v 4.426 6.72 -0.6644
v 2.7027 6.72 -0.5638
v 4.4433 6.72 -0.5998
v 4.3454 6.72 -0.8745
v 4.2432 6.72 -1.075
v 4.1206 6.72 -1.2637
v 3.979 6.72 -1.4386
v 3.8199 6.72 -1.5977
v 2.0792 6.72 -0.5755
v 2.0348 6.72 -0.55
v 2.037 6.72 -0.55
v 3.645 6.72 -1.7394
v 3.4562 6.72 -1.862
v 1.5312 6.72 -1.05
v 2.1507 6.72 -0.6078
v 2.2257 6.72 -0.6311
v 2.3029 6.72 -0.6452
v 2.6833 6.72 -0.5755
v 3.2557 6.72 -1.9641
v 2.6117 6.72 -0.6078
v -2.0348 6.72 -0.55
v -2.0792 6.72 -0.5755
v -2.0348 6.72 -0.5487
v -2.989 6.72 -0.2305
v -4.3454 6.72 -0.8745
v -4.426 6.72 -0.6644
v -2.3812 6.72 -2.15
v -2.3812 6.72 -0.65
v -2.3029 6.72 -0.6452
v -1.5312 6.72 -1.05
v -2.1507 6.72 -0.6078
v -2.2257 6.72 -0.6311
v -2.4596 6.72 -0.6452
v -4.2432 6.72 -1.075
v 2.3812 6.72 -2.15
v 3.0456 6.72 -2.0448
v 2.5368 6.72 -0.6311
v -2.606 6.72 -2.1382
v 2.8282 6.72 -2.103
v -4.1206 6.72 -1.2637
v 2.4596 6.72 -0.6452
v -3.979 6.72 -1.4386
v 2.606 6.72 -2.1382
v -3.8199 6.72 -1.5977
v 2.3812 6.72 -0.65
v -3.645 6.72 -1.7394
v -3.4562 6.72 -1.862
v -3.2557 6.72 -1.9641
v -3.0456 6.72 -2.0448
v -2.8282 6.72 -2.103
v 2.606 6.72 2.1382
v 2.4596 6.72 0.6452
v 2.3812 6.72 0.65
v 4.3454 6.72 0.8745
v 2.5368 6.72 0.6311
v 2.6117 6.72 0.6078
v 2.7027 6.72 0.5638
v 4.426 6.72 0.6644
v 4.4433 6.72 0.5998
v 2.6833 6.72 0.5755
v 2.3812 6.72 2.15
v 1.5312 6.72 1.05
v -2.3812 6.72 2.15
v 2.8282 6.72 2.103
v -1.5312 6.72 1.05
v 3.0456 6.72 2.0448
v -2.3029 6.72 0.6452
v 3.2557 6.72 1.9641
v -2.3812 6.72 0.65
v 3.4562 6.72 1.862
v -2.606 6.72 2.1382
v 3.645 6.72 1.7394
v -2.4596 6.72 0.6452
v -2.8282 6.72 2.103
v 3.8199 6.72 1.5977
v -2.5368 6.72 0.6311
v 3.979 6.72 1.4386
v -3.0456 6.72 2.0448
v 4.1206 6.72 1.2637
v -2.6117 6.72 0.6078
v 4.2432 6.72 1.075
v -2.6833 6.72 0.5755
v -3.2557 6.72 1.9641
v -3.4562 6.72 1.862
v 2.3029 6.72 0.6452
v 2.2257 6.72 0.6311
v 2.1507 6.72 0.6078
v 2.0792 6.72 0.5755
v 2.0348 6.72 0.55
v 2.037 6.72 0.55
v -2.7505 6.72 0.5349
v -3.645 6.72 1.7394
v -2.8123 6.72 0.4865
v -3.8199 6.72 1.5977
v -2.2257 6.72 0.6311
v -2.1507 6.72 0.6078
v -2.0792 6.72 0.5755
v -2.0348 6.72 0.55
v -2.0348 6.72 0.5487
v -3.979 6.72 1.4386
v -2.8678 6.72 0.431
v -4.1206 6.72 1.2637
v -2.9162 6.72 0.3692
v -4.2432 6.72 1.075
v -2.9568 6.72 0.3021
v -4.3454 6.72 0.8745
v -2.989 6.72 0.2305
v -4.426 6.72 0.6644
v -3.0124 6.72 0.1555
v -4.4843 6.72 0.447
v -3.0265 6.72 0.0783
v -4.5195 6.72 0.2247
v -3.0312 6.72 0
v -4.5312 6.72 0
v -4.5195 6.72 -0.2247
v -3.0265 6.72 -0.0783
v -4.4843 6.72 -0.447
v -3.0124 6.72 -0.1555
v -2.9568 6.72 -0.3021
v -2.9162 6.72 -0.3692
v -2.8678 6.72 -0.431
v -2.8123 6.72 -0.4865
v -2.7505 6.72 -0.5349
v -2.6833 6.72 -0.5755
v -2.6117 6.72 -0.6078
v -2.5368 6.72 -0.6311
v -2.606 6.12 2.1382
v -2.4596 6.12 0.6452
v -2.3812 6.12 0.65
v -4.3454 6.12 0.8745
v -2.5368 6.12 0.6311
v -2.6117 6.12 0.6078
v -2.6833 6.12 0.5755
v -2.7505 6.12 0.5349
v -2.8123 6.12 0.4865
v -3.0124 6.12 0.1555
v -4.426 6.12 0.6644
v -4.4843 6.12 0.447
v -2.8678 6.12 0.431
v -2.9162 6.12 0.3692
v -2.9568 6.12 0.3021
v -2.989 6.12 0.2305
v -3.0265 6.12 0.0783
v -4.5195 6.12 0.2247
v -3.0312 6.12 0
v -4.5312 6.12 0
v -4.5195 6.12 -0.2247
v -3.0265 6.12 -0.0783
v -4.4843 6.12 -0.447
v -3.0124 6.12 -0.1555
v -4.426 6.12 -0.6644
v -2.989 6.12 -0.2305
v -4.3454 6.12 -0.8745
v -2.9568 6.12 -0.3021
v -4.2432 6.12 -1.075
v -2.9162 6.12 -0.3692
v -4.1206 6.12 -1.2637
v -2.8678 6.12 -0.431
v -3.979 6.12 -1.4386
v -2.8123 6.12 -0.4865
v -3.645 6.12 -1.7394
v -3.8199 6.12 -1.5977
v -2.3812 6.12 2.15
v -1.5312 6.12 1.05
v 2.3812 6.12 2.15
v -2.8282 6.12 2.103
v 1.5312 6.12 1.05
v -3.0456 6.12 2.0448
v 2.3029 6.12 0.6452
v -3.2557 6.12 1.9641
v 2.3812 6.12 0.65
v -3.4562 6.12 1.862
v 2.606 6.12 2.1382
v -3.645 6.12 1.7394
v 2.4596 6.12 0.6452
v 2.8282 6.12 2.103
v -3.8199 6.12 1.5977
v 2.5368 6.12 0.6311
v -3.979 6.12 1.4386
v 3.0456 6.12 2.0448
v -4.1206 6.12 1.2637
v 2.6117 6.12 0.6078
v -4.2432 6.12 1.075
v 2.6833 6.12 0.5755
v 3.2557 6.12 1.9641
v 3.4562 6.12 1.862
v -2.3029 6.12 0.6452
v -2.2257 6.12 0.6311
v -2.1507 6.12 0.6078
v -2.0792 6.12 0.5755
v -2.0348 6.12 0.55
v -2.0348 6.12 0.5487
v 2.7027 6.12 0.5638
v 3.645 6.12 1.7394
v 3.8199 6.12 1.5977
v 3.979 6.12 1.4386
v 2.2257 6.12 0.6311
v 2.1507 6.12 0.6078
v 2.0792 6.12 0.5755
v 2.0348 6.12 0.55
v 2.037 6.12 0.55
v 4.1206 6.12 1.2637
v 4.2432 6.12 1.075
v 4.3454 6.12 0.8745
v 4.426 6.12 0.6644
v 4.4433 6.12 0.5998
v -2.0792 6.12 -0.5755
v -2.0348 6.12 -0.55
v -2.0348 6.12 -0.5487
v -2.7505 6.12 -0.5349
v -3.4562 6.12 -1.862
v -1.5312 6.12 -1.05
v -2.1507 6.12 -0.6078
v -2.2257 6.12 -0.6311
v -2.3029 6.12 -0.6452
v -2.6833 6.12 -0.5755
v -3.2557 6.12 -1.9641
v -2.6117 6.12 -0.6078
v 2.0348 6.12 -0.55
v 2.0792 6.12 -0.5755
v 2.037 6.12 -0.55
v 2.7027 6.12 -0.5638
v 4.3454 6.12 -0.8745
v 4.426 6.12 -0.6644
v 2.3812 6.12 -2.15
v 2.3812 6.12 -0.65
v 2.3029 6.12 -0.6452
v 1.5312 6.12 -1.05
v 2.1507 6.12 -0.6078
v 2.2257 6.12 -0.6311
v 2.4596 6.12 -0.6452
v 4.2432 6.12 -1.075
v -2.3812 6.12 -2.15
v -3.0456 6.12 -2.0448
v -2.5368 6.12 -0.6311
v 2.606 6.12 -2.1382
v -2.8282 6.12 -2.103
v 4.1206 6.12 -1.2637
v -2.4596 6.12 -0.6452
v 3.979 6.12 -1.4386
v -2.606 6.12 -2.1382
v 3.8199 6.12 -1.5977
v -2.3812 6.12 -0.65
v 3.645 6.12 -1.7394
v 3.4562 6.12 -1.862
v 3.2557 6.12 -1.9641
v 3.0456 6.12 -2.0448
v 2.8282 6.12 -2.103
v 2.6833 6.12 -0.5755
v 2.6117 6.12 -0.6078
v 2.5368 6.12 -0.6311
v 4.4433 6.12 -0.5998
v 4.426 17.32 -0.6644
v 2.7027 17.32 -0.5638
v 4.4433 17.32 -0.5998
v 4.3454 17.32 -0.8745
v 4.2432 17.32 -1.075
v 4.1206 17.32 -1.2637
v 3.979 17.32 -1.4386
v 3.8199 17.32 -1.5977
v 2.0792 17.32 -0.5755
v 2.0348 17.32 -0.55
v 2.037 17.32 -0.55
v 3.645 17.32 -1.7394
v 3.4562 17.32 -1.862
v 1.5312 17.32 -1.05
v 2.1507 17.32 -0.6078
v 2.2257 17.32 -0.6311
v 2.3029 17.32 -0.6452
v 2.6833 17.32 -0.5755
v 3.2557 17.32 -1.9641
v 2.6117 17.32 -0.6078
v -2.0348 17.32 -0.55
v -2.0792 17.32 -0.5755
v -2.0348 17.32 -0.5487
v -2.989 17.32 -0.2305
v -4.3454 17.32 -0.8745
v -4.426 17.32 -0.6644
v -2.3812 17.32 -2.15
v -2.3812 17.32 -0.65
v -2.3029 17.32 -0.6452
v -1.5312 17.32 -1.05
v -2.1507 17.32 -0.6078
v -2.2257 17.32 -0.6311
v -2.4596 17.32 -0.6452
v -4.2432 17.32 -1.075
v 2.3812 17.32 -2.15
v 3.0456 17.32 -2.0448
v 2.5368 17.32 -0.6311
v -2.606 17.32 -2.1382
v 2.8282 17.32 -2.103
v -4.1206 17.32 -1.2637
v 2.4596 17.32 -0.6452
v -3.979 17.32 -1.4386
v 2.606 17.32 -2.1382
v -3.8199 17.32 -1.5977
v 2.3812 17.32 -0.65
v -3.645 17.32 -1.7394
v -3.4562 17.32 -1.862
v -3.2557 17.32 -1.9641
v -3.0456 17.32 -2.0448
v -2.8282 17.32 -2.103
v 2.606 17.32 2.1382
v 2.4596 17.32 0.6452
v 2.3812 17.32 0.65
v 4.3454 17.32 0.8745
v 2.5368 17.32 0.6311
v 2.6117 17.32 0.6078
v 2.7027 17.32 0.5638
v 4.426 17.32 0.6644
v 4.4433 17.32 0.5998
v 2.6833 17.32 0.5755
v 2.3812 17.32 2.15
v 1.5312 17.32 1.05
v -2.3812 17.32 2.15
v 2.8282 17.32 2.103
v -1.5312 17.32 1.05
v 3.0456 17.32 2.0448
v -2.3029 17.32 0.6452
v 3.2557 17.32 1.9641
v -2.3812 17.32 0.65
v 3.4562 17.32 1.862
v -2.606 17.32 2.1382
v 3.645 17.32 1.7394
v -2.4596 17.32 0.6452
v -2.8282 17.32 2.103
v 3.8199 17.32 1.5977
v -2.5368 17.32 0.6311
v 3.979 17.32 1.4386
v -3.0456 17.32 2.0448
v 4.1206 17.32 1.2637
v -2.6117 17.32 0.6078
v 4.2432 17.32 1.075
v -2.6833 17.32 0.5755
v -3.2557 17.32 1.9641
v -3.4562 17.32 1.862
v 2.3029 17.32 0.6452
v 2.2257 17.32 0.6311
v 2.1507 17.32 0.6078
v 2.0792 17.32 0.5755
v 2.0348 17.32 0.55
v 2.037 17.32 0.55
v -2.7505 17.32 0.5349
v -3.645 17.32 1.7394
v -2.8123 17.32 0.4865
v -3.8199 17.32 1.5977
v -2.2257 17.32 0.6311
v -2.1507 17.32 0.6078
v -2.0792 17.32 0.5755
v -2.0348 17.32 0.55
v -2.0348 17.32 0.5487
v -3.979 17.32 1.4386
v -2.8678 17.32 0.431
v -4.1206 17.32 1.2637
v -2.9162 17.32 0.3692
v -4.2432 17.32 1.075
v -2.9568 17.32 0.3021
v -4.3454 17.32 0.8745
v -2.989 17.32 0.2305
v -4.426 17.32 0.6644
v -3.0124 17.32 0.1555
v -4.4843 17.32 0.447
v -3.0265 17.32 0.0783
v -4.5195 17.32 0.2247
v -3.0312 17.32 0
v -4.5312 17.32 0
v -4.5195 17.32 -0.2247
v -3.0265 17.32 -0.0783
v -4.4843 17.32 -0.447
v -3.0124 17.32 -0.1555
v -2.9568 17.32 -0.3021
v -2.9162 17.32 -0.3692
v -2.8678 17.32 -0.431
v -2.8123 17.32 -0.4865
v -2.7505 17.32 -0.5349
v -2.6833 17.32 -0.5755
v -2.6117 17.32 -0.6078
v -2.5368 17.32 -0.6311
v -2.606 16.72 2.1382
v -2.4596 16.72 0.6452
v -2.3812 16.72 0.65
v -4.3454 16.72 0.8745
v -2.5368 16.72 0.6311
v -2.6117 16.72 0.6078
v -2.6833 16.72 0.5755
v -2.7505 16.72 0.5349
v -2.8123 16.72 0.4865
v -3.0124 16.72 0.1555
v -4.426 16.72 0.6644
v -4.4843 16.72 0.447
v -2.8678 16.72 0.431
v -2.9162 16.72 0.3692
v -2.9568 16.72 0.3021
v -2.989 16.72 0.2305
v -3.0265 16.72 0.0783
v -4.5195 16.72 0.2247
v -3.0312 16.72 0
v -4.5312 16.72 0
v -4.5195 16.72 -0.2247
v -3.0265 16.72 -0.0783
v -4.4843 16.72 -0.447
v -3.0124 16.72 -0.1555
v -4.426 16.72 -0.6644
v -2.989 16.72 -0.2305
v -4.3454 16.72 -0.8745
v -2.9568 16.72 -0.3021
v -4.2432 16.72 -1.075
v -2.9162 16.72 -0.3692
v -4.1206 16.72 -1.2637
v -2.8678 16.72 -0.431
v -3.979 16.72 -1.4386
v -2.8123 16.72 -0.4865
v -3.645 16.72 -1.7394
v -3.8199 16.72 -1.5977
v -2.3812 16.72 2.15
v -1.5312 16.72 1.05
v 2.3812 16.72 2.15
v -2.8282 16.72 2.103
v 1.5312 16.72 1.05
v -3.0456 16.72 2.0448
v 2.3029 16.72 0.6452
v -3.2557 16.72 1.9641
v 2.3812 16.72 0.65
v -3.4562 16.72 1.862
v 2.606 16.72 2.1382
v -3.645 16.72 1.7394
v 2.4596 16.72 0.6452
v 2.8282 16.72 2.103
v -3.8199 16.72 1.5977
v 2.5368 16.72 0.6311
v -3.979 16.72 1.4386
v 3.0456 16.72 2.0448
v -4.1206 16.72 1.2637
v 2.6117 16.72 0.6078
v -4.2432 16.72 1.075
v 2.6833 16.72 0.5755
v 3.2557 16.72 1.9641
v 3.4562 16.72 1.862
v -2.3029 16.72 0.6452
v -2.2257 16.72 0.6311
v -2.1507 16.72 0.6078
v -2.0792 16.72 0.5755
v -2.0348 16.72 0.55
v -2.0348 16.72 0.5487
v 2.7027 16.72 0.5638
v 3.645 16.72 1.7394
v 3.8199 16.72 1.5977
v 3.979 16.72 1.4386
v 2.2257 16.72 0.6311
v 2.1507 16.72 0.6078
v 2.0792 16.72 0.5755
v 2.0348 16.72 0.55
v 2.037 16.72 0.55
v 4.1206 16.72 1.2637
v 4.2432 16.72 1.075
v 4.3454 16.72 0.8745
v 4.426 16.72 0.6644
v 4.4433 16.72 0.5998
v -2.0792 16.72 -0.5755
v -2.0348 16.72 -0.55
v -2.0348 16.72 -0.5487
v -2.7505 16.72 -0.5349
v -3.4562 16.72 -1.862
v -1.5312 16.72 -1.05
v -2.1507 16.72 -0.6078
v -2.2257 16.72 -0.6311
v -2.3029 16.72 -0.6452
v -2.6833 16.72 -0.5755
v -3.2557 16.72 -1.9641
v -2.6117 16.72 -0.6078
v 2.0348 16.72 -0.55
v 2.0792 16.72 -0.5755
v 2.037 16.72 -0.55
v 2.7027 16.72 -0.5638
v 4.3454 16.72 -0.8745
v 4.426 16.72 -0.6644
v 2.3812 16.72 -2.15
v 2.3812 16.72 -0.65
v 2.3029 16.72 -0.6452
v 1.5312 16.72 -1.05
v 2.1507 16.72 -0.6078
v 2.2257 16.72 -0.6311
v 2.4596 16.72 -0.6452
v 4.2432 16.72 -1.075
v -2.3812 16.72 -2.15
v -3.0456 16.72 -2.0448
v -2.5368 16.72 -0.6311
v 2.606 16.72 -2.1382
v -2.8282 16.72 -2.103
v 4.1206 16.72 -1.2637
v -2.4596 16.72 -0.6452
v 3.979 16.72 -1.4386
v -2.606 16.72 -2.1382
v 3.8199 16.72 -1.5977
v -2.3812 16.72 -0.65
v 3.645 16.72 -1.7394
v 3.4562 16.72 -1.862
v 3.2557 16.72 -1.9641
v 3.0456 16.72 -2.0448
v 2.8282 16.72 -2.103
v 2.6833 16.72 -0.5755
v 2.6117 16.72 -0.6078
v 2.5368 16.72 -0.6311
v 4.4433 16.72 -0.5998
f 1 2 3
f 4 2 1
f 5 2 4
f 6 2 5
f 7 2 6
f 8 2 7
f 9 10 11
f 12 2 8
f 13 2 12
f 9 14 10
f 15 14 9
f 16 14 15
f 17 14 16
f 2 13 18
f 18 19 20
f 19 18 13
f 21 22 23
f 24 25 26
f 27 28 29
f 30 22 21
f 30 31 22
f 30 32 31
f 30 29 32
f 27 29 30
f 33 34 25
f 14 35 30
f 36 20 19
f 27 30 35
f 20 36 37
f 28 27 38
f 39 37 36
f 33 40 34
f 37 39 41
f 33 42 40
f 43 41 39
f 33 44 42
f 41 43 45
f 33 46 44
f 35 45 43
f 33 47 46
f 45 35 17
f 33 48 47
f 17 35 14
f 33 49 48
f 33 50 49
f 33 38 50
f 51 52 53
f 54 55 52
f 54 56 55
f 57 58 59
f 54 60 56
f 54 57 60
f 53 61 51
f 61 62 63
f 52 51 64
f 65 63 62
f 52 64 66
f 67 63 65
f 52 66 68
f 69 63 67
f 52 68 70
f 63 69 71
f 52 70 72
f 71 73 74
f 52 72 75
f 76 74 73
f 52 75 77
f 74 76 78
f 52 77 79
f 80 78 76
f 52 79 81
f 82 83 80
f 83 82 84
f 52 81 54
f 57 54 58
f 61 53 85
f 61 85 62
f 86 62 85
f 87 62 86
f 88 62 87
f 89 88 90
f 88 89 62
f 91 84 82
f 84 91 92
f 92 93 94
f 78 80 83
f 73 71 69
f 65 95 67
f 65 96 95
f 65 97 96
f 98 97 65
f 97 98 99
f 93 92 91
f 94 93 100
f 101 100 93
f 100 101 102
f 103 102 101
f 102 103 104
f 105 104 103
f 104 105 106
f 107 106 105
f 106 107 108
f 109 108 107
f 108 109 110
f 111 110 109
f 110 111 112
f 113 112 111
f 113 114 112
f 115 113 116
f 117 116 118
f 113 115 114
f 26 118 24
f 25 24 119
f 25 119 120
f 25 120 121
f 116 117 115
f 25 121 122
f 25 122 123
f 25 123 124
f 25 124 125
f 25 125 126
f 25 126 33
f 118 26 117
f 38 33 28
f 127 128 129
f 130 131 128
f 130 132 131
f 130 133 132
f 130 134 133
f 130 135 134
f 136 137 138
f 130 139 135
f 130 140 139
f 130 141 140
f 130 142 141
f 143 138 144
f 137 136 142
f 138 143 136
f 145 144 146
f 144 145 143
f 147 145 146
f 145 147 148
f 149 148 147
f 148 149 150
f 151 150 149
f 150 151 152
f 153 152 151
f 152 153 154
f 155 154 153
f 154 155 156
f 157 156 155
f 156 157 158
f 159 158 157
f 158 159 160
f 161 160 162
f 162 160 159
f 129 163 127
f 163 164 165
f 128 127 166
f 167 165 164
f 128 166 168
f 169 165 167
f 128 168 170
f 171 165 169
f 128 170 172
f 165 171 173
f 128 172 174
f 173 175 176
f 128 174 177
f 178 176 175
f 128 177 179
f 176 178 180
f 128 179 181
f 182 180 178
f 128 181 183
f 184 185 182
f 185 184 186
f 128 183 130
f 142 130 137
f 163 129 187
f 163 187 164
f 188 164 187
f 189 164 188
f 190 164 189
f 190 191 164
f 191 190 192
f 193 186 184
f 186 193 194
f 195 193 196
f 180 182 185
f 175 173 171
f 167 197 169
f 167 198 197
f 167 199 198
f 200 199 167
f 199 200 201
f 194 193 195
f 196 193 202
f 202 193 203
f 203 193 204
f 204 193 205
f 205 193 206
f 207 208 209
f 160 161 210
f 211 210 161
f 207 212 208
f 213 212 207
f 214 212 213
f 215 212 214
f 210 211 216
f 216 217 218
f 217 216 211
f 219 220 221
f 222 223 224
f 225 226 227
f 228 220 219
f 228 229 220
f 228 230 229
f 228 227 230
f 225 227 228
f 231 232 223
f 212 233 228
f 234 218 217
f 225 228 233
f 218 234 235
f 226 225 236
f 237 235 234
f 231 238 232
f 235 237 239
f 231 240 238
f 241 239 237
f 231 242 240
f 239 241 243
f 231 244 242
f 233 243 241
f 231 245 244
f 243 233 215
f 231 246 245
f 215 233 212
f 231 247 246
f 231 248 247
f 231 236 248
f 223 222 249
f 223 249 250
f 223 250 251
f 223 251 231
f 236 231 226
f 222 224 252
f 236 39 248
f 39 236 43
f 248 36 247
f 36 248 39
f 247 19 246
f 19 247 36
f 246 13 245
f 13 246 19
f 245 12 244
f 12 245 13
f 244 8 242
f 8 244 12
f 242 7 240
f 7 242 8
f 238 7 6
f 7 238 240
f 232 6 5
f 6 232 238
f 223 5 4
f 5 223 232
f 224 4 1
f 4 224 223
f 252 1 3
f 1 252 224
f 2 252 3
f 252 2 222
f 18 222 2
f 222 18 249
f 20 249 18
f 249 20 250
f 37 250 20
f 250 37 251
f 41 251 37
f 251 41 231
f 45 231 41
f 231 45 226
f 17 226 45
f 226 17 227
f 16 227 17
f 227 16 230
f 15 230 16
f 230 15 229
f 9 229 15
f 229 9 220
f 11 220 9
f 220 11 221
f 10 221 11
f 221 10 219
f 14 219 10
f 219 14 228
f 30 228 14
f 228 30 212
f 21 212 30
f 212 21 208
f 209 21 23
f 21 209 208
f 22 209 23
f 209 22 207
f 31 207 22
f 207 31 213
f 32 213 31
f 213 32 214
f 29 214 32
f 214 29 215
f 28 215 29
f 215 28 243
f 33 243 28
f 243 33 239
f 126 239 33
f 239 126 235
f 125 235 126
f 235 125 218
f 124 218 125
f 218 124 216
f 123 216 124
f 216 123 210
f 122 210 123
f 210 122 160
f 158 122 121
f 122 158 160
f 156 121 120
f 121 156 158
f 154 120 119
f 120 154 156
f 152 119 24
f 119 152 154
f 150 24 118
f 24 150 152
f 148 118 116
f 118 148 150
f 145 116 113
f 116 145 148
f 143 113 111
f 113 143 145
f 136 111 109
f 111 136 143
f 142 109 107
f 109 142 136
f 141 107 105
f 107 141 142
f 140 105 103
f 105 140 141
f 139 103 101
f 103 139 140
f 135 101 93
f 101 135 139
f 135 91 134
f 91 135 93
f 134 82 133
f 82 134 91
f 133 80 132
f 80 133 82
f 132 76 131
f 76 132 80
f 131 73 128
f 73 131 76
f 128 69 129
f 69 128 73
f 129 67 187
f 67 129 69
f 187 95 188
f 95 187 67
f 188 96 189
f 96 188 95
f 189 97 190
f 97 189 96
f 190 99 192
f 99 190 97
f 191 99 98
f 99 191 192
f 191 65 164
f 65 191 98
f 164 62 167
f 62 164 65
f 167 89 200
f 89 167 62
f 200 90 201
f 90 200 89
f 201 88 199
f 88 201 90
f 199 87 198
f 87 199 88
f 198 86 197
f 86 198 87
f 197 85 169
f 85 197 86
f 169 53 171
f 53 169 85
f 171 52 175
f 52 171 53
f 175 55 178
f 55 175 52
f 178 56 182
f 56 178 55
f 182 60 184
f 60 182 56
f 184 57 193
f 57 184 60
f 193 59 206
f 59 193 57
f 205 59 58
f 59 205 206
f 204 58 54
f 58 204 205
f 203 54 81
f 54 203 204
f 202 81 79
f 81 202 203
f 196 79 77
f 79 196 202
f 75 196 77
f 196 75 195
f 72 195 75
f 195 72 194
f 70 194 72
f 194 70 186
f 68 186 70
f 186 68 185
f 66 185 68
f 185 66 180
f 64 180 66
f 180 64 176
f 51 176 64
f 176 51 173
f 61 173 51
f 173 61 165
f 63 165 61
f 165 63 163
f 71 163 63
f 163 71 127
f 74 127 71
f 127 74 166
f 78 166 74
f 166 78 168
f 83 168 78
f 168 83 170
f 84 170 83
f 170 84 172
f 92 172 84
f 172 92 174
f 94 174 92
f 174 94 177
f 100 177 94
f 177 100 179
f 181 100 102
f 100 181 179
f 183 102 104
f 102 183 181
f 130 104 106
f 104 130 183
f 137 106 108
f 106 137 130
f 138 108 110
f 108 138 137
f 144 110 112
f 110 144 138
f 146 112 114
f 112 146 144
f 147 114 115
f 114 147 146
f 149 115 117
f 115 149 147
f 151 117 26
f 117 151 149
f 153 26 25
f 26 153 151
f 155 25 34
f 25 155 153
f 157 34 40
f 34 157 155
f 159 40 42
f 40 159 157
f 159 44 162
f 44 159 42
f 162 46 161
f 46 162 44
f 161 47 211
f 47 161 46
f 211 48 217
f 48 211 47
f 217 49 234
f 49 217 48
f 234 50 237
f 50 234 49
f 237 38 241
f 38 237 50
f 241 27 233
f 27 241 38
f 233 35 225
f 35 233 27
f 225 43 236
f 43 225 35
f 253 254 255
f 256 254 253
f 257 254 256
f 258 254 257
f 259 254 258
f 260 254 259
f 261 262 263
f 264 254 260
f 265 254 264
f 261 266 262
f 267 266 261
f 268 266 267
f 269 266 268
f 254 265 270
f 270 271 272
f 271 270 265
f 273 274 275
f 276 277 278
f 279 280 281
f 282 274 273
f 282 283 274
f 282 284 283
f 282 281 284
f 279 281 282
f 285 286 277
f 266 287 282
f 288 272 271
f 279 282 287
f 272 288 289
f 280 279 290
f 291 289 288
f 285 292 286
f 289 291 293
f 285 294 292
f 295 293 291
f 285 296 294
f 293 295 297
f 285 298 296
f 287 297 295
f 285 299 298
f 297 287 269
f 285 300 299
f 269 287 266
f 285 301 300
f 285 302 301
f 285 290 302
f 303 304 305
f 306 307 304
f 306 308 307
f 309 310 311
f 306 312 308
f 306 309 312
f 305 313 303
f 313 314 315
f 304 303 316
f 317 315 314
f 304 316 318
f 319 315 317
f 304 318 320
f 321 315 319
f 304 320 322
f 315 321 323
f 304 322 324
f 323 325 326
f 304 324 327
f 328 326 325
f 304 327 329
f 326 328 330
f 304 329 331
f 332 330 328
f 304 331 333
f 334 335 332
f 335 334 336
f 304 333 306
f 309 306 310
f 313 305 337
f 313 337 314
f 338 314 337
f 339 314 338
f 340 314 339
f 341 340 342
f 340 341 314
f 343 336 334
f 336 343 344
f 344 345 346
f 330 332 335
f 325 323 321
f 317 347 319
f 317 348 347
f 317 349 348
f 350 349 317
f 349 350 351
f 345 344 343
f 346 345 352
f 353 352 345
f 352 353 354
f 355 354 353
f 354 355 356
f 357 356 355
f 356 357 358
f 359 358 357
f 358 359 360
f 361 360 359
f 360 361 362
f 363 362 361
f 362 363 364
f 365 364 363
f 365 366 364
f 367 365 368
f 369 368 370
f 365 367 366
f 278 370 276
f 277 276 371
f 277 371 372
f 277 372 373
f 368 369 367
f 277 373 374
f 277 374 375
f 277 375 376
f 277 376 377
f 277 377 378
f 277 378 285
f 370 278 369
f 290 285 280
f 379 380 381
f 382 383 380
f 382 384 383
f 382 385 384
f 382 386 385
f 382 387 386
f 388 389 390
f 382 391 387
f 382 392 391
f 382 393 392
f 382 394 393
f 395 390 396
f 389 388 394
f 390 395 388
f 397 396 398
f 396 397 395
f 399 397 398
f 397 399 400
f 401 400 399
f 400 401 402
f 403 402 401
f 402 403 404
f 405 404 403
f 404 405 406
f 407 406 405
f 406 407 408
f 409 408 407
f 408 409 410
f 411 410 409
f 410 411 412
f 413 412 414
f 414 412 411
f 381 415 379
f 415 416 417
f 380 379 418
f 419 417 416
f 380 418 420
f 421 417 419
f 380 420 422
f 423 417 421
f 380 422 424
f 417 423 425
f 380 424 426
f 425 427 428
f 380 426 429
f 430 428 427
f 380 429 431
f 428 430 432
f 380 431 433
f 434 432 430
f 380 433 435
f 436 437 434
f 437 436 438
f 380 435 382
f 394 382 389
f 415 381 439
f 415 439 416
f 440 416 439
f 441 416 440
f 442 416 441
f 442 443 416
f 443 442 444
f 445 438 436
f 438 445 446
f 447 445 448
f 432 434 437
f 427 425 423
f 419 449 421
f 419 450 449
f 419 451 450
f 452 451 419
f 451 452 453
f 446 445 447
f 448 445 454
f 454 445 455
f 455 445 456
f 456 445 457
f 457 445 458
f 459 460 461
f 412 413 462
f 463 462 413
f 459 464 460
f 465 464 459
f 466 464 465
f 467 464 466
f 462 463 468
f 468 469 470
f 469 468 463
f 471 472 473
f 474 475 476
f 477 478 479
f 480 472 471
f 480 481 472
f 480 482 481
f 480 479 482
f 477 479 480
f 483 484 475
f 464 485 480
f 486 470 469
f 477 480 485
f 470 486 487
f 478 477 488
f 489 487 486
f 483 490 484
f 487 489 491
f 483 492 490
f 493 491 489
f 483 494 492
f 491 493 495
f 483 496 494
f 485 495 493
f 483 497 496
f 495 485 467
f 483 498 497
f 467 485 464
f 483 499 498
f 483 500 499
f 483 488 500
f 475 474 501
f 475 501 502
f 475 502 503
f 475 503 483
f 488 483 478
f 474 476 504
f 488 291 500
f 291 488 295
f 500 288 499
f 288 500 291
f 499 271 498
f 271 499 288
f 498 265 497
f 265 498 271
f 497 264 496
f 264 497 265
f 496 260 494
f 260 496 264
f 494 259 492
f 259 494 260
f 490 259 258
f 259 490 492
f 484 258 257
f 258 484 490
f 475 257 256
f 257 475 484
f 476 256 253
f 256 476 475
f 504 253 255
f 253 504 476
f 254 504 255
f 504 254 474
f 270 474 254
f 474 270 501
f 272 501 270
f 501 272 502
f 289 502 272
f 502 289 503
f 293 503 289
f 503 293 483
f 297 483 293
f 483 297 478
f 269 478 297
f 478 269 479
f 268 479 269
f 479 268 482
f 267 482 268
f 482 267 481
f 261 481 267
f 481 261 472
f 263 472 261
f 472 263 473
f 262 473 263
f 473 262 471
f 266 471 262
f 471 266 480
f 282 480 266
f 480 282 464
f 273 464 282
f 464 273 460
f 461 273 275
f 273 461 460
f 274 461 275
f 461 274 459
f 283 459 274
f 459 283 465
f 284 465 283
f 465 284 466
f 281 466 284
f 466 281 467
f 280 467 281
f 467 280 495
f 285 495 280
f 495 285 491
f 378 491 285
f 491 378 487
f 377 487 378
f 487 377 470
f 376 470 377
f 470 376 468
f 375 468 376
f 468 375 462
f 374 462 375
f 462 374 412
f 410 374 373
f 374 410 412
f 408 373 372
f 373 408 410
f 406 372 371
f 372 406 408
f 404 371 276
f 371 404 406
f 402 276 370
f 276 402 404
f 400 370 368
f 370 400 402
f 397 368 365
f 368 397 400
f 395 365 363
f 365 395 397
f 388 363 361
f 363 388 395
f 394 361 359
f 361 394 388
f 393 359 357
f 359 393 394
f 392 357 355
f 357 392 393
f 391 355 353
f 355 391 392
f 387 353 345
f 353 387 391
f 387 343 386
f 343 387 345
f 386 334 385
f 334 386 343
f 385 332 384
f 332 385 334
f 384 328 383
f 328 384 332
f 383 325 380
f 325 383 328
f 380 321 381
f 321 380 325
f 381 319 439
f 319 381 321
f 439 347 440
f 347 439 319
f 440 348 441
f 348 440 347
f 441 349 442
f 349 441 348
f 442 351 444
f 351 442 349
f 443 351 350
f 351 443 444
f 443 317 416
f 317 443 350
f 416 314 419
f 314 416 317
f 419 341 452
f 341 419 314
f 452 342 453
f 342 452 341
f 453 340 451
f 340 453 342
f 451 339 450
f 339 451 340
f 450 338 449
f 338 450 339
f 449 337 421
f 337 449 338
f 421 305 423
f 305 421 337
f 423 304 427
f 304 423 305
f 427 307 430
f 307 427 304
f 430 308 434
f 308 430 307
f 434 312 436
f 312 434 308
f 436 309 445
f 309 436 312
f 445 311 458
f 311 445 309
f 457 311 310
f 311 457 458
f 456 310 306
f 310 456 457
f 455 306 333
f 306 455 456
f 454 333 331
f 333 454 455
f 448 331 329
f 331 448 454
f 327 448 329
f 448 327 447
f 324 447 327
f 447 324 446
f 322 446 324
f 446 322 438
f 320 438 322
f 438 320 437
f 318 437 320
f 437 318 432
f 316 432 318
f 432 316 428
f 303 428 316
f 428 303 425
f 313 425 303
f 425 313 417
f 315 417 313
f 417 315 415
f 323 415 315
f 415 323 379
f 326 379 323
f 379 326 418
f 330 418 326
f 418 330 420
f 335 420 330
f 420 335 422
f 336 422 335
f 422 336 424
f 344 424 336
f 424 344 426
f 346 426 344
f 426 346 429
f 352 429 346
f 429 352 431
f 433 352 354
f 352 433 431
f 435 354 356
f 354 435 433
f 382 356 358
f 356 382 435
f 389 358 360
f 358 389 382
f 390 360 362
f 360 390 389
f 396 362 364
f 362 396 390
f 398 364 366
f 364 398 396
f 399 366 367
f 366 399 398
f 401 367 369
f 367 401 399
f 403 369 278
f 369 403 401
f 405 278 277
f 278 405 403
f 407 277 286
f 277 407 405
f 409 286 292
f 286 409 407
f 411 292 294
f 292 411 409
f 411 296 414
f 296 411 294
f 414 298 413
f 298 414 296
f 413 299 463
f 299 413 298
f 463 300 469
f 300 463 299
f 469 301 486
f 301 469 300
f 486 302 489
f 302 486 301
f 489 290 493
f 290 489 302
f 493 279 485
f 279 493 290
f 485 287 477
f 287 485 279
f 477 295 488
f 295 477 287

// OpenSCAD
// file: ch1_03c_params.scad
// CH1 03C 单排滚子链 — 尺寸真值源：docs/parts/CH1-03C-roller-chain.md
// 单位：毫米。这是外购碳钢链条的 CAD 包络，不是 FDM 打印件。

//#region 导入/依赖
// 无外部库；几何由本文件常数驱动。
//#endregion

//#region 常量/配置
P = 4.7625;          // 节距：系列表 / SKU 210L（图面写 4.762）
h2 = 4.3;            // 内链板高度 h2（卖家图 + ISO h2 max）
d1 = 2.48;           // 03C 图面「滚子」= ISO 套筒外径 d1 max（本规格无独立滚子）
d2 = 1.62;           // 销轴直径 d2 max
Lc = 6.9;            // ISO / 图面销轴总长 Lc max；装配外形用贴板铆头，不把细杆伸出这么长
L = 6.10;            // 铆头内侧销长 L max（ISO，图面未标数）
T = 0.6;             // 链板厚度 T max
b1 = 2.38;           // 内节内宽 b1 min（ISO；图面有符号无数字）
waist = 2.6;         // 链板腰宽：按卖家 8 字外形，不是标准表列
rivet_d = 2.15;      // 铆头直径：按侧视铆头 > d2
rivet_h = 0.40;      // 贴在外板外侧的铆头高度；避免 (Lc-L)/2 拉出细 stem
fillet = 0.42;       // 腰部凹圆角
roller_end_gap = 0.02;  // 仅 CSG 间隙，不留可见轴向窜动
journal_od = 2.05;      // 穿内板轴颈；可见鼓面仍用 d1
links_sku = 210;

inner_width = b1;
bushing_od = journal_od;
plate_stack = inner_width + 4 * T;
outer_face = plate_stack / 2;
pin_length = plate_stack + 2 * rivet_h;
visible_bush_len = inner_width - 2 * roller_end_gap;
clearance = 0.04;
eps = 0.05;
//#endregion

//#region 模型/类型
// 无独立类型；零件由 inner/outer plate、roller、pin、bushing 组成。
//#endregion

//#region 私有成员
// 几何常数全部公开给根模型 include。
//#endregion

//#region 公开 API
// include 后直接使用 P / h2 / d1 / d2 / pin_length / T。
//#endregion

//#region 业务逻辑
// SKU 210L × 4.7625 mm = 1000.125 mm。
// b1 / L 图面未标数，取 ISO 03C min/max；链板腰宽按卖家 8 字外形。
// 可见套筒长度必须是 b1，不是 b1+2T；后者会从斜向看成过长的连接棍。
// 销轴细杆只穿过板叠；铆头贴外板。Lc=6.9 是规格上限，不是要把 stem 拉到 6.9。
//#endregion

//#region 方法/工具
// 无。
//#endregion
// file: parts/ch1_03c_connecting_link_params.scad
// CH1 03C 连接节五金 — 由 docs/parts/CH1-03C-roller-chain.md 参数化
// 单位：毫米。03C 链条本体是外购碳钢件；这里是连接节穿销/弹片的参考模型。

//#region 导入/依赖
include <../ch1_03c_params.scad>
//#endregion

//#region 常量/配置
$fa = 6;
$fs = 0.08;

// 文档明确给出的连接节主尺寸。
CONNECTING_PIN_PAIR_SPACING = P;       // 两根穿销的中心距 = 链条节距
CONNECTING_PIN_SHAFT_D = d2;           // 03C 销轴直径
CONNECTING_PIN_LENGTH = Lc;            // 03C 图面销轴总长
CONNECTING_PIN_HEAD_D = rivet_d;       // 固定端圆头的参考直径
CONNECTING_PIN_HEAD_H = rivet_h;

// 卖家文档没有给 03C CL 卡簧的完整展开图；以下是按用户提供的
// 「加长销/加长销带挡板」图和实物照片建立的装配参考假设。
// 卡簧按用户给出的实物轮廓建模：右端敞口；两根销的位置各有一段围绕销槽
// 的圆弧，圆弧之间由上下两条收腰弹臂连接。它不是等宽 U 槽，也不是两个
// 独立的 C 形耳片或实心连接链板。
CONNECTING_PIN_GROOVE_D = 1.20;
RETAINING_CLIP_T = T;                 // 03C 片厚；图示 04C 的 T=0.8 不套用
// 槽宽要覆盖整片厚度，并留少量侧向装配余量；原 0.34 mm 小于片厚，不能落槽。
CONNECTING_PIN_GROOVE_W = RETAINING_CLIP_T + 0.12;
CONNECTING_PIN_GROOVE_FROM_TIP = 0.48;
CONNECTING_PIN_GROOVE_CENTER = CONNECTING_PIN_LENGTH / 2 - CONNECTING_PIN_GROOVE_FROM_TIP;
CONNECTING_LINK_EPS = 0.05;
RETAINING_CLIP_H = h2;                // 外轮廓高度，沿用连接节链板高度
RETAINING_CLIP_OUTER_R = RETAINING_CLIP_H / 2;
RETAINING_CLIP_PIN_ARC_INNER_R = CONNECTING_PIN_GROOVE_D / 2 + 0.05;
RETAINING_CLIP_CLOSED_PIN_X = -CONNECTING_PIN_PAIR_SPACING / 2;
RETAINING_CLIP_OPEN_PIN_X = CONNECTING_PIN_PAIR_SPACING / 2;
// 右侧两段圆弧的末端张开到槽底直径附近，但小于完整销身直径，形成锁止口。
RETAINING_CLIP_OPEN_HALF_ANGLE = 68;
RETAINING_CLIP_THROAT_GAP_H = 2 * RETAINING_CLIP_PIN_ARC_INNER_R * sin(RETAINING_CLIP_OPEN_HALF_ANGLE);
RETAINING_CLIP_OPEN_TIP_X = RETAINING_CLIP_OPEN_PIN_X + RETAINING_CLIP_OUTER_R + CONNECTING_LINK_EPS;
// 中间开口在两销之间放宽，在销位处收回到圆弧；这样圆弧不会被直线开口吞掉。
RETAINING_CLIP_SLOT_CENTER_HALF_H = 1.05;
RETAINING_CLIP_PIN_JOIN_HALF_H = 0.55;
RETAINING_CLIP_SLOT_RAMP_X = 0.85;
RETAINING_CLIP_PIN_JOIN_DX = sqrt(
    RETAINING_CLIP_PIN_ARC_INNER_R * RETAINING_CLIP_PIN_ARC_INNER_R
    - RETAINING_CLIP_PIN_JOIN_HALF_H * RETAINING_CLIP_PIN_JOIN_HALF_H
);
RETAINING_CLIP_LEFT_JOIN_X = RETAINING_CLIP_CLOSED_PIN_X + RETAINING_CLIP_PIN_JOIN_DX;
RETAINING_CLIP_RIGHT_JOIN_X = RETAINING_CLIP_OPEN_PIN_X - RETAINING_CLIP_PIN_JOIN_DX;
RETAINING_CLIP_LEFT_RAMP_X = RETAINING_CLIP_CLOSED_PIN_X + RETAINING_CLIP_SLOT_RAMP_X;
RETAINING_CLIP_RIGHT_RAMP_X = RETAINING_CLIP_OPEN_PIN_X - RETAINING_CLIP_SLOT_RAMP_X;
RETAINING_CLIP_OPEN_HALF_H = RETAINING_CLIP_THROAT_GAP_H / 2;
//#endregion

//#region 模型/类型
// 连接节局部坐标：两销中心位于 x=±P/2，销轴沿 +Y；固定头在 -Y 端。
// 弹片位于 +Y 端槽内：局部 -X 是闭合圆弧端，局部 +X 是两段圆弧形成的敞口端；
// 两弹臂从闭端向开口侧销逐渐收腰，右侧圆弧的内缘落入销轴环槽。
// 独立打印时绕 X 轴旋转 90° 铺平。
//#endregion

//#region 公开 API
// include 后可调用 ch1_03c_connecting_pin_pair()、ch1_03c_retaining_clip()。
//#endregion

//#region 私有成员
module connecting_pin_groove_cut(x) {
    translate([
        x,
        CONNECTING_PIN_GROOVE_CENTER - CONNECTING_PIN_GROOVE_W / 2,
        0
    ])
        rotate([-90, 0, 0])
            difference() {
                cylinder(
                    d = CONNECTING_PIN_SHAFT_D + 0.60,
                    h = CONNECTING_PIN_GROOVE_W
                );
                translate([0, 0, -CONNECTING_LINK_EPS])
                    cylinder(
                        d = CONNECTING_PIN_GROOVE_D,
                        h = CONNECTING_PIN_GROOVE_W + 2 * CONNECTING_LINK_EPS
                    );
            }
}

module connecting_pin_one(x) {
    difference() {
        union() {
            translate([x, -CONNECTING_PIN_LENGTH / 2, 0])
                rotate([-90, 0, 0])
                    cylinder(d = CONNECTING_PIN_SHAFT_D, h = CONNECTING_PIN_LENGTH);
            translate([x, -CONNECTING_PIN_LENGTH / 2, 0])
                rotate([-90, 0, 0])
                    cylinder(d = CONNECTING_PIN_HEAD_D, h = CONNECTING_PIN_HEAD_H);
        }
        connecting_pin_groove_cut(x);
    }
}

module retaining_clip_outer_profile_2d() {
    // 绿色箭头所示的外轮廓：两销中心同轴的长圆外廓，右端由内腔切开。
    union() {
        translate([RETAINING_CLIP_CLOSED_PIN_X, 0])
            circle(r = RETAINING_CLIP_OUTER_R);
        translate([RETAINING_CLIP_OPEN_PIN_X, 0])
            circle(r = RETAINING_CLIP_OUTER_R);
        translate([RETAINING_CLIP_CLOSED_PIN_X, -RETAINING_CLIP_OUTER_R])
            square([
                CONNECTING_PIN_PAIR_SPACING,
                2 * RETAINING_CLIP_OUTER_R
            ]);
    }
}

module retaining_clip_opening_2d() {
    // 绿色箭头所示的内轮廓：左销位圆弧 → 放宽的中间段 → 右销位圆弧 → 右端开口。
    // 直线在圆弧的上/下交点处过渡，不能从销中心直接切过去。
    union() {
        translate([RETAINING_CLIP_CLOSED_PIN_X, 0])
            circle(r = RETAINING_CLIP_PIN_ARC_INNER_R);
        translate([RETAINING_CLIP_OPEN_PIN_X, 0])
            circle(r = RETAINING_CLIP_PIN_ARC_INNER_R);
        polygon([
            [RETAINING_CLIP_LEFT_JOIN_X, -RETAINING_CLIP_PIN_JOIN_HALF_H],
            [RETAINING_CLIP_LEFT_RAMP_X, -RETAINING_CLIP_SLOT_CENTER_HALF_H],
            [RETAINING_CLIP_RIGHT_RAMP_X, -RETAINING_CLIP_SLOT_CENTER_HALF_H],
            [RETAINING_CLIP_RIGHT_JOIN_X, -RETAINING_CLIP_PIN_JOIN_HALF_H],
            [RETAINING_CLIP_OPEN_TIP_X, -RETAINING_CLIP_OPEN_HALF_H],
            [RETAINING_CLIP_OPEN_TIP_X, RETAINING_CLIP_OPEN_HALF_H],
            [RETAINING_CLIP_RIGHT_JOIN_X, RETAINING_CLIP_PIN_JOIN_HALF_H],
            [RETAINING_CLIP_RIGHT_RAMP_X, RETAINING_CLIP_SLOT_CENTER_HALF_H],
            [RETAINING_CLIP_LEFT_RAMP_X, RETAINING_CLIP_SLOT_CENTER_HALF_H],
            [RETAINING_CLIP_LEFT_JOIN_X, RETAINING_CLIP_PIN_JOIN_HALF_H]
        ]);
    }
}

module retaining_clip_profile_2d() {
    union() {
        difference() {
            retaining_clip_outer_profile_2d();
            retaining_clip_opening_2d();
        }
    }
}
//#endregion

//#region 业务逻辑
module ch1_03c_connecting_pin_pair() {
    for (x = [-CONNECTING_PIN_PAIR_SPACING / 2, CONNECTING_PIN_PAIR_SPACING / 2])
        connecting_pin_one(x);
}

module ch1_03c_retaining_clip() {
    // 与双销保持同一装配坐标；单独打印时应将夹片绕 X 轴旋转 90° 铺平。
    translate([0, CONNECTING_PIN_GROOVE_CENTER, 0])
        rotate([90, 0, 0])
            linear_extrude(
                height = RETAINING_CLIP_T,
                center = true,
                convexity = 6
            )
                retaining_clip_profile_2d();
}

module ch1_03c_connecting_link_reference() {
    color("#b08d57") ch1_03c_connecting_pin_pair();
    color("#9aa7b6") ch1_03c_retaining_clip();
}
//#endregion

//#region 方法/工具
assert(CONNECTING_PIN_GROOVE_W > RETAINING_CLIP_T);
assert(RETAINING_CLIP_THROAT_GAP_H > CONNECTING_PIN_GROOVE_D - 0.01);
assert(RETAINING_CLIP_THROAT_GAP_H < CONNECTING_PIN_SHAFT_D);
assert(RETAINING_CLIP_CLOSED_PIN_X < RETAINING_CLIP_OPEN_PIN_X);
assert(RETAINING_CLIP_OPEN_TIP_X > RETAINING_CLIP_OPEN_PIN_X);
assert(RETAINING_CLIP_PIN_JOIN_HALF_H < RETAINING_CLIP_PIN_ARC_INNER_R);
assert(RETAINING_CLIP_LEFT_JOIN_X < RETAINING_CLIP_LEFT_RAMP_X);
assert(RETAINING_CLIP_RIGHT_RAMP_X < RETAINING_CLIP_RIGHT_JOIN_X);
assert(RETAINING_CLIP_SLOT_CENTER_HALF_H > RETAINING_CLIP_PIN_JOIN_HALF_H);
assert(RETAINING_CLIP_OPEN_HALF_H < RETAINING_CLIP_PIN_ARC_INNER_R);
// 此文件是库；独立导出入口见 cad/openscad/ch1_03c_connecting_pin.scad
// 和 cad/openscad/ch1_03c_retaining_clip.scad。
//#endregion
// main file
// CH1 03C 加长销双固定弹片/夹片 — 独立模型库入口

//#region 导入/依赖
include <parts/ch1_03c_extended_link_params.scad>
//#endregion

//#region 常量/配置
PART = is_undef(PART) ? "clips" : PART;
//#endregion

//#region 公开 API
if (PART == "clips")
    ch1_03c_extended_retaining_clips();
else if (PART == "assembly")
    ch1_03c_extended_link_reference();
//#endregion

//#region 业务逻辑
// 两只右端敞口的双销圆弧弹片分别锁在第一/第二道销槽；每只夹片的两根销位
// 都保留贴槽圆弧，模型保持与加长销相同的装配坐标，夹片内侧之间留 10 mm 净空间。
//#endregion
